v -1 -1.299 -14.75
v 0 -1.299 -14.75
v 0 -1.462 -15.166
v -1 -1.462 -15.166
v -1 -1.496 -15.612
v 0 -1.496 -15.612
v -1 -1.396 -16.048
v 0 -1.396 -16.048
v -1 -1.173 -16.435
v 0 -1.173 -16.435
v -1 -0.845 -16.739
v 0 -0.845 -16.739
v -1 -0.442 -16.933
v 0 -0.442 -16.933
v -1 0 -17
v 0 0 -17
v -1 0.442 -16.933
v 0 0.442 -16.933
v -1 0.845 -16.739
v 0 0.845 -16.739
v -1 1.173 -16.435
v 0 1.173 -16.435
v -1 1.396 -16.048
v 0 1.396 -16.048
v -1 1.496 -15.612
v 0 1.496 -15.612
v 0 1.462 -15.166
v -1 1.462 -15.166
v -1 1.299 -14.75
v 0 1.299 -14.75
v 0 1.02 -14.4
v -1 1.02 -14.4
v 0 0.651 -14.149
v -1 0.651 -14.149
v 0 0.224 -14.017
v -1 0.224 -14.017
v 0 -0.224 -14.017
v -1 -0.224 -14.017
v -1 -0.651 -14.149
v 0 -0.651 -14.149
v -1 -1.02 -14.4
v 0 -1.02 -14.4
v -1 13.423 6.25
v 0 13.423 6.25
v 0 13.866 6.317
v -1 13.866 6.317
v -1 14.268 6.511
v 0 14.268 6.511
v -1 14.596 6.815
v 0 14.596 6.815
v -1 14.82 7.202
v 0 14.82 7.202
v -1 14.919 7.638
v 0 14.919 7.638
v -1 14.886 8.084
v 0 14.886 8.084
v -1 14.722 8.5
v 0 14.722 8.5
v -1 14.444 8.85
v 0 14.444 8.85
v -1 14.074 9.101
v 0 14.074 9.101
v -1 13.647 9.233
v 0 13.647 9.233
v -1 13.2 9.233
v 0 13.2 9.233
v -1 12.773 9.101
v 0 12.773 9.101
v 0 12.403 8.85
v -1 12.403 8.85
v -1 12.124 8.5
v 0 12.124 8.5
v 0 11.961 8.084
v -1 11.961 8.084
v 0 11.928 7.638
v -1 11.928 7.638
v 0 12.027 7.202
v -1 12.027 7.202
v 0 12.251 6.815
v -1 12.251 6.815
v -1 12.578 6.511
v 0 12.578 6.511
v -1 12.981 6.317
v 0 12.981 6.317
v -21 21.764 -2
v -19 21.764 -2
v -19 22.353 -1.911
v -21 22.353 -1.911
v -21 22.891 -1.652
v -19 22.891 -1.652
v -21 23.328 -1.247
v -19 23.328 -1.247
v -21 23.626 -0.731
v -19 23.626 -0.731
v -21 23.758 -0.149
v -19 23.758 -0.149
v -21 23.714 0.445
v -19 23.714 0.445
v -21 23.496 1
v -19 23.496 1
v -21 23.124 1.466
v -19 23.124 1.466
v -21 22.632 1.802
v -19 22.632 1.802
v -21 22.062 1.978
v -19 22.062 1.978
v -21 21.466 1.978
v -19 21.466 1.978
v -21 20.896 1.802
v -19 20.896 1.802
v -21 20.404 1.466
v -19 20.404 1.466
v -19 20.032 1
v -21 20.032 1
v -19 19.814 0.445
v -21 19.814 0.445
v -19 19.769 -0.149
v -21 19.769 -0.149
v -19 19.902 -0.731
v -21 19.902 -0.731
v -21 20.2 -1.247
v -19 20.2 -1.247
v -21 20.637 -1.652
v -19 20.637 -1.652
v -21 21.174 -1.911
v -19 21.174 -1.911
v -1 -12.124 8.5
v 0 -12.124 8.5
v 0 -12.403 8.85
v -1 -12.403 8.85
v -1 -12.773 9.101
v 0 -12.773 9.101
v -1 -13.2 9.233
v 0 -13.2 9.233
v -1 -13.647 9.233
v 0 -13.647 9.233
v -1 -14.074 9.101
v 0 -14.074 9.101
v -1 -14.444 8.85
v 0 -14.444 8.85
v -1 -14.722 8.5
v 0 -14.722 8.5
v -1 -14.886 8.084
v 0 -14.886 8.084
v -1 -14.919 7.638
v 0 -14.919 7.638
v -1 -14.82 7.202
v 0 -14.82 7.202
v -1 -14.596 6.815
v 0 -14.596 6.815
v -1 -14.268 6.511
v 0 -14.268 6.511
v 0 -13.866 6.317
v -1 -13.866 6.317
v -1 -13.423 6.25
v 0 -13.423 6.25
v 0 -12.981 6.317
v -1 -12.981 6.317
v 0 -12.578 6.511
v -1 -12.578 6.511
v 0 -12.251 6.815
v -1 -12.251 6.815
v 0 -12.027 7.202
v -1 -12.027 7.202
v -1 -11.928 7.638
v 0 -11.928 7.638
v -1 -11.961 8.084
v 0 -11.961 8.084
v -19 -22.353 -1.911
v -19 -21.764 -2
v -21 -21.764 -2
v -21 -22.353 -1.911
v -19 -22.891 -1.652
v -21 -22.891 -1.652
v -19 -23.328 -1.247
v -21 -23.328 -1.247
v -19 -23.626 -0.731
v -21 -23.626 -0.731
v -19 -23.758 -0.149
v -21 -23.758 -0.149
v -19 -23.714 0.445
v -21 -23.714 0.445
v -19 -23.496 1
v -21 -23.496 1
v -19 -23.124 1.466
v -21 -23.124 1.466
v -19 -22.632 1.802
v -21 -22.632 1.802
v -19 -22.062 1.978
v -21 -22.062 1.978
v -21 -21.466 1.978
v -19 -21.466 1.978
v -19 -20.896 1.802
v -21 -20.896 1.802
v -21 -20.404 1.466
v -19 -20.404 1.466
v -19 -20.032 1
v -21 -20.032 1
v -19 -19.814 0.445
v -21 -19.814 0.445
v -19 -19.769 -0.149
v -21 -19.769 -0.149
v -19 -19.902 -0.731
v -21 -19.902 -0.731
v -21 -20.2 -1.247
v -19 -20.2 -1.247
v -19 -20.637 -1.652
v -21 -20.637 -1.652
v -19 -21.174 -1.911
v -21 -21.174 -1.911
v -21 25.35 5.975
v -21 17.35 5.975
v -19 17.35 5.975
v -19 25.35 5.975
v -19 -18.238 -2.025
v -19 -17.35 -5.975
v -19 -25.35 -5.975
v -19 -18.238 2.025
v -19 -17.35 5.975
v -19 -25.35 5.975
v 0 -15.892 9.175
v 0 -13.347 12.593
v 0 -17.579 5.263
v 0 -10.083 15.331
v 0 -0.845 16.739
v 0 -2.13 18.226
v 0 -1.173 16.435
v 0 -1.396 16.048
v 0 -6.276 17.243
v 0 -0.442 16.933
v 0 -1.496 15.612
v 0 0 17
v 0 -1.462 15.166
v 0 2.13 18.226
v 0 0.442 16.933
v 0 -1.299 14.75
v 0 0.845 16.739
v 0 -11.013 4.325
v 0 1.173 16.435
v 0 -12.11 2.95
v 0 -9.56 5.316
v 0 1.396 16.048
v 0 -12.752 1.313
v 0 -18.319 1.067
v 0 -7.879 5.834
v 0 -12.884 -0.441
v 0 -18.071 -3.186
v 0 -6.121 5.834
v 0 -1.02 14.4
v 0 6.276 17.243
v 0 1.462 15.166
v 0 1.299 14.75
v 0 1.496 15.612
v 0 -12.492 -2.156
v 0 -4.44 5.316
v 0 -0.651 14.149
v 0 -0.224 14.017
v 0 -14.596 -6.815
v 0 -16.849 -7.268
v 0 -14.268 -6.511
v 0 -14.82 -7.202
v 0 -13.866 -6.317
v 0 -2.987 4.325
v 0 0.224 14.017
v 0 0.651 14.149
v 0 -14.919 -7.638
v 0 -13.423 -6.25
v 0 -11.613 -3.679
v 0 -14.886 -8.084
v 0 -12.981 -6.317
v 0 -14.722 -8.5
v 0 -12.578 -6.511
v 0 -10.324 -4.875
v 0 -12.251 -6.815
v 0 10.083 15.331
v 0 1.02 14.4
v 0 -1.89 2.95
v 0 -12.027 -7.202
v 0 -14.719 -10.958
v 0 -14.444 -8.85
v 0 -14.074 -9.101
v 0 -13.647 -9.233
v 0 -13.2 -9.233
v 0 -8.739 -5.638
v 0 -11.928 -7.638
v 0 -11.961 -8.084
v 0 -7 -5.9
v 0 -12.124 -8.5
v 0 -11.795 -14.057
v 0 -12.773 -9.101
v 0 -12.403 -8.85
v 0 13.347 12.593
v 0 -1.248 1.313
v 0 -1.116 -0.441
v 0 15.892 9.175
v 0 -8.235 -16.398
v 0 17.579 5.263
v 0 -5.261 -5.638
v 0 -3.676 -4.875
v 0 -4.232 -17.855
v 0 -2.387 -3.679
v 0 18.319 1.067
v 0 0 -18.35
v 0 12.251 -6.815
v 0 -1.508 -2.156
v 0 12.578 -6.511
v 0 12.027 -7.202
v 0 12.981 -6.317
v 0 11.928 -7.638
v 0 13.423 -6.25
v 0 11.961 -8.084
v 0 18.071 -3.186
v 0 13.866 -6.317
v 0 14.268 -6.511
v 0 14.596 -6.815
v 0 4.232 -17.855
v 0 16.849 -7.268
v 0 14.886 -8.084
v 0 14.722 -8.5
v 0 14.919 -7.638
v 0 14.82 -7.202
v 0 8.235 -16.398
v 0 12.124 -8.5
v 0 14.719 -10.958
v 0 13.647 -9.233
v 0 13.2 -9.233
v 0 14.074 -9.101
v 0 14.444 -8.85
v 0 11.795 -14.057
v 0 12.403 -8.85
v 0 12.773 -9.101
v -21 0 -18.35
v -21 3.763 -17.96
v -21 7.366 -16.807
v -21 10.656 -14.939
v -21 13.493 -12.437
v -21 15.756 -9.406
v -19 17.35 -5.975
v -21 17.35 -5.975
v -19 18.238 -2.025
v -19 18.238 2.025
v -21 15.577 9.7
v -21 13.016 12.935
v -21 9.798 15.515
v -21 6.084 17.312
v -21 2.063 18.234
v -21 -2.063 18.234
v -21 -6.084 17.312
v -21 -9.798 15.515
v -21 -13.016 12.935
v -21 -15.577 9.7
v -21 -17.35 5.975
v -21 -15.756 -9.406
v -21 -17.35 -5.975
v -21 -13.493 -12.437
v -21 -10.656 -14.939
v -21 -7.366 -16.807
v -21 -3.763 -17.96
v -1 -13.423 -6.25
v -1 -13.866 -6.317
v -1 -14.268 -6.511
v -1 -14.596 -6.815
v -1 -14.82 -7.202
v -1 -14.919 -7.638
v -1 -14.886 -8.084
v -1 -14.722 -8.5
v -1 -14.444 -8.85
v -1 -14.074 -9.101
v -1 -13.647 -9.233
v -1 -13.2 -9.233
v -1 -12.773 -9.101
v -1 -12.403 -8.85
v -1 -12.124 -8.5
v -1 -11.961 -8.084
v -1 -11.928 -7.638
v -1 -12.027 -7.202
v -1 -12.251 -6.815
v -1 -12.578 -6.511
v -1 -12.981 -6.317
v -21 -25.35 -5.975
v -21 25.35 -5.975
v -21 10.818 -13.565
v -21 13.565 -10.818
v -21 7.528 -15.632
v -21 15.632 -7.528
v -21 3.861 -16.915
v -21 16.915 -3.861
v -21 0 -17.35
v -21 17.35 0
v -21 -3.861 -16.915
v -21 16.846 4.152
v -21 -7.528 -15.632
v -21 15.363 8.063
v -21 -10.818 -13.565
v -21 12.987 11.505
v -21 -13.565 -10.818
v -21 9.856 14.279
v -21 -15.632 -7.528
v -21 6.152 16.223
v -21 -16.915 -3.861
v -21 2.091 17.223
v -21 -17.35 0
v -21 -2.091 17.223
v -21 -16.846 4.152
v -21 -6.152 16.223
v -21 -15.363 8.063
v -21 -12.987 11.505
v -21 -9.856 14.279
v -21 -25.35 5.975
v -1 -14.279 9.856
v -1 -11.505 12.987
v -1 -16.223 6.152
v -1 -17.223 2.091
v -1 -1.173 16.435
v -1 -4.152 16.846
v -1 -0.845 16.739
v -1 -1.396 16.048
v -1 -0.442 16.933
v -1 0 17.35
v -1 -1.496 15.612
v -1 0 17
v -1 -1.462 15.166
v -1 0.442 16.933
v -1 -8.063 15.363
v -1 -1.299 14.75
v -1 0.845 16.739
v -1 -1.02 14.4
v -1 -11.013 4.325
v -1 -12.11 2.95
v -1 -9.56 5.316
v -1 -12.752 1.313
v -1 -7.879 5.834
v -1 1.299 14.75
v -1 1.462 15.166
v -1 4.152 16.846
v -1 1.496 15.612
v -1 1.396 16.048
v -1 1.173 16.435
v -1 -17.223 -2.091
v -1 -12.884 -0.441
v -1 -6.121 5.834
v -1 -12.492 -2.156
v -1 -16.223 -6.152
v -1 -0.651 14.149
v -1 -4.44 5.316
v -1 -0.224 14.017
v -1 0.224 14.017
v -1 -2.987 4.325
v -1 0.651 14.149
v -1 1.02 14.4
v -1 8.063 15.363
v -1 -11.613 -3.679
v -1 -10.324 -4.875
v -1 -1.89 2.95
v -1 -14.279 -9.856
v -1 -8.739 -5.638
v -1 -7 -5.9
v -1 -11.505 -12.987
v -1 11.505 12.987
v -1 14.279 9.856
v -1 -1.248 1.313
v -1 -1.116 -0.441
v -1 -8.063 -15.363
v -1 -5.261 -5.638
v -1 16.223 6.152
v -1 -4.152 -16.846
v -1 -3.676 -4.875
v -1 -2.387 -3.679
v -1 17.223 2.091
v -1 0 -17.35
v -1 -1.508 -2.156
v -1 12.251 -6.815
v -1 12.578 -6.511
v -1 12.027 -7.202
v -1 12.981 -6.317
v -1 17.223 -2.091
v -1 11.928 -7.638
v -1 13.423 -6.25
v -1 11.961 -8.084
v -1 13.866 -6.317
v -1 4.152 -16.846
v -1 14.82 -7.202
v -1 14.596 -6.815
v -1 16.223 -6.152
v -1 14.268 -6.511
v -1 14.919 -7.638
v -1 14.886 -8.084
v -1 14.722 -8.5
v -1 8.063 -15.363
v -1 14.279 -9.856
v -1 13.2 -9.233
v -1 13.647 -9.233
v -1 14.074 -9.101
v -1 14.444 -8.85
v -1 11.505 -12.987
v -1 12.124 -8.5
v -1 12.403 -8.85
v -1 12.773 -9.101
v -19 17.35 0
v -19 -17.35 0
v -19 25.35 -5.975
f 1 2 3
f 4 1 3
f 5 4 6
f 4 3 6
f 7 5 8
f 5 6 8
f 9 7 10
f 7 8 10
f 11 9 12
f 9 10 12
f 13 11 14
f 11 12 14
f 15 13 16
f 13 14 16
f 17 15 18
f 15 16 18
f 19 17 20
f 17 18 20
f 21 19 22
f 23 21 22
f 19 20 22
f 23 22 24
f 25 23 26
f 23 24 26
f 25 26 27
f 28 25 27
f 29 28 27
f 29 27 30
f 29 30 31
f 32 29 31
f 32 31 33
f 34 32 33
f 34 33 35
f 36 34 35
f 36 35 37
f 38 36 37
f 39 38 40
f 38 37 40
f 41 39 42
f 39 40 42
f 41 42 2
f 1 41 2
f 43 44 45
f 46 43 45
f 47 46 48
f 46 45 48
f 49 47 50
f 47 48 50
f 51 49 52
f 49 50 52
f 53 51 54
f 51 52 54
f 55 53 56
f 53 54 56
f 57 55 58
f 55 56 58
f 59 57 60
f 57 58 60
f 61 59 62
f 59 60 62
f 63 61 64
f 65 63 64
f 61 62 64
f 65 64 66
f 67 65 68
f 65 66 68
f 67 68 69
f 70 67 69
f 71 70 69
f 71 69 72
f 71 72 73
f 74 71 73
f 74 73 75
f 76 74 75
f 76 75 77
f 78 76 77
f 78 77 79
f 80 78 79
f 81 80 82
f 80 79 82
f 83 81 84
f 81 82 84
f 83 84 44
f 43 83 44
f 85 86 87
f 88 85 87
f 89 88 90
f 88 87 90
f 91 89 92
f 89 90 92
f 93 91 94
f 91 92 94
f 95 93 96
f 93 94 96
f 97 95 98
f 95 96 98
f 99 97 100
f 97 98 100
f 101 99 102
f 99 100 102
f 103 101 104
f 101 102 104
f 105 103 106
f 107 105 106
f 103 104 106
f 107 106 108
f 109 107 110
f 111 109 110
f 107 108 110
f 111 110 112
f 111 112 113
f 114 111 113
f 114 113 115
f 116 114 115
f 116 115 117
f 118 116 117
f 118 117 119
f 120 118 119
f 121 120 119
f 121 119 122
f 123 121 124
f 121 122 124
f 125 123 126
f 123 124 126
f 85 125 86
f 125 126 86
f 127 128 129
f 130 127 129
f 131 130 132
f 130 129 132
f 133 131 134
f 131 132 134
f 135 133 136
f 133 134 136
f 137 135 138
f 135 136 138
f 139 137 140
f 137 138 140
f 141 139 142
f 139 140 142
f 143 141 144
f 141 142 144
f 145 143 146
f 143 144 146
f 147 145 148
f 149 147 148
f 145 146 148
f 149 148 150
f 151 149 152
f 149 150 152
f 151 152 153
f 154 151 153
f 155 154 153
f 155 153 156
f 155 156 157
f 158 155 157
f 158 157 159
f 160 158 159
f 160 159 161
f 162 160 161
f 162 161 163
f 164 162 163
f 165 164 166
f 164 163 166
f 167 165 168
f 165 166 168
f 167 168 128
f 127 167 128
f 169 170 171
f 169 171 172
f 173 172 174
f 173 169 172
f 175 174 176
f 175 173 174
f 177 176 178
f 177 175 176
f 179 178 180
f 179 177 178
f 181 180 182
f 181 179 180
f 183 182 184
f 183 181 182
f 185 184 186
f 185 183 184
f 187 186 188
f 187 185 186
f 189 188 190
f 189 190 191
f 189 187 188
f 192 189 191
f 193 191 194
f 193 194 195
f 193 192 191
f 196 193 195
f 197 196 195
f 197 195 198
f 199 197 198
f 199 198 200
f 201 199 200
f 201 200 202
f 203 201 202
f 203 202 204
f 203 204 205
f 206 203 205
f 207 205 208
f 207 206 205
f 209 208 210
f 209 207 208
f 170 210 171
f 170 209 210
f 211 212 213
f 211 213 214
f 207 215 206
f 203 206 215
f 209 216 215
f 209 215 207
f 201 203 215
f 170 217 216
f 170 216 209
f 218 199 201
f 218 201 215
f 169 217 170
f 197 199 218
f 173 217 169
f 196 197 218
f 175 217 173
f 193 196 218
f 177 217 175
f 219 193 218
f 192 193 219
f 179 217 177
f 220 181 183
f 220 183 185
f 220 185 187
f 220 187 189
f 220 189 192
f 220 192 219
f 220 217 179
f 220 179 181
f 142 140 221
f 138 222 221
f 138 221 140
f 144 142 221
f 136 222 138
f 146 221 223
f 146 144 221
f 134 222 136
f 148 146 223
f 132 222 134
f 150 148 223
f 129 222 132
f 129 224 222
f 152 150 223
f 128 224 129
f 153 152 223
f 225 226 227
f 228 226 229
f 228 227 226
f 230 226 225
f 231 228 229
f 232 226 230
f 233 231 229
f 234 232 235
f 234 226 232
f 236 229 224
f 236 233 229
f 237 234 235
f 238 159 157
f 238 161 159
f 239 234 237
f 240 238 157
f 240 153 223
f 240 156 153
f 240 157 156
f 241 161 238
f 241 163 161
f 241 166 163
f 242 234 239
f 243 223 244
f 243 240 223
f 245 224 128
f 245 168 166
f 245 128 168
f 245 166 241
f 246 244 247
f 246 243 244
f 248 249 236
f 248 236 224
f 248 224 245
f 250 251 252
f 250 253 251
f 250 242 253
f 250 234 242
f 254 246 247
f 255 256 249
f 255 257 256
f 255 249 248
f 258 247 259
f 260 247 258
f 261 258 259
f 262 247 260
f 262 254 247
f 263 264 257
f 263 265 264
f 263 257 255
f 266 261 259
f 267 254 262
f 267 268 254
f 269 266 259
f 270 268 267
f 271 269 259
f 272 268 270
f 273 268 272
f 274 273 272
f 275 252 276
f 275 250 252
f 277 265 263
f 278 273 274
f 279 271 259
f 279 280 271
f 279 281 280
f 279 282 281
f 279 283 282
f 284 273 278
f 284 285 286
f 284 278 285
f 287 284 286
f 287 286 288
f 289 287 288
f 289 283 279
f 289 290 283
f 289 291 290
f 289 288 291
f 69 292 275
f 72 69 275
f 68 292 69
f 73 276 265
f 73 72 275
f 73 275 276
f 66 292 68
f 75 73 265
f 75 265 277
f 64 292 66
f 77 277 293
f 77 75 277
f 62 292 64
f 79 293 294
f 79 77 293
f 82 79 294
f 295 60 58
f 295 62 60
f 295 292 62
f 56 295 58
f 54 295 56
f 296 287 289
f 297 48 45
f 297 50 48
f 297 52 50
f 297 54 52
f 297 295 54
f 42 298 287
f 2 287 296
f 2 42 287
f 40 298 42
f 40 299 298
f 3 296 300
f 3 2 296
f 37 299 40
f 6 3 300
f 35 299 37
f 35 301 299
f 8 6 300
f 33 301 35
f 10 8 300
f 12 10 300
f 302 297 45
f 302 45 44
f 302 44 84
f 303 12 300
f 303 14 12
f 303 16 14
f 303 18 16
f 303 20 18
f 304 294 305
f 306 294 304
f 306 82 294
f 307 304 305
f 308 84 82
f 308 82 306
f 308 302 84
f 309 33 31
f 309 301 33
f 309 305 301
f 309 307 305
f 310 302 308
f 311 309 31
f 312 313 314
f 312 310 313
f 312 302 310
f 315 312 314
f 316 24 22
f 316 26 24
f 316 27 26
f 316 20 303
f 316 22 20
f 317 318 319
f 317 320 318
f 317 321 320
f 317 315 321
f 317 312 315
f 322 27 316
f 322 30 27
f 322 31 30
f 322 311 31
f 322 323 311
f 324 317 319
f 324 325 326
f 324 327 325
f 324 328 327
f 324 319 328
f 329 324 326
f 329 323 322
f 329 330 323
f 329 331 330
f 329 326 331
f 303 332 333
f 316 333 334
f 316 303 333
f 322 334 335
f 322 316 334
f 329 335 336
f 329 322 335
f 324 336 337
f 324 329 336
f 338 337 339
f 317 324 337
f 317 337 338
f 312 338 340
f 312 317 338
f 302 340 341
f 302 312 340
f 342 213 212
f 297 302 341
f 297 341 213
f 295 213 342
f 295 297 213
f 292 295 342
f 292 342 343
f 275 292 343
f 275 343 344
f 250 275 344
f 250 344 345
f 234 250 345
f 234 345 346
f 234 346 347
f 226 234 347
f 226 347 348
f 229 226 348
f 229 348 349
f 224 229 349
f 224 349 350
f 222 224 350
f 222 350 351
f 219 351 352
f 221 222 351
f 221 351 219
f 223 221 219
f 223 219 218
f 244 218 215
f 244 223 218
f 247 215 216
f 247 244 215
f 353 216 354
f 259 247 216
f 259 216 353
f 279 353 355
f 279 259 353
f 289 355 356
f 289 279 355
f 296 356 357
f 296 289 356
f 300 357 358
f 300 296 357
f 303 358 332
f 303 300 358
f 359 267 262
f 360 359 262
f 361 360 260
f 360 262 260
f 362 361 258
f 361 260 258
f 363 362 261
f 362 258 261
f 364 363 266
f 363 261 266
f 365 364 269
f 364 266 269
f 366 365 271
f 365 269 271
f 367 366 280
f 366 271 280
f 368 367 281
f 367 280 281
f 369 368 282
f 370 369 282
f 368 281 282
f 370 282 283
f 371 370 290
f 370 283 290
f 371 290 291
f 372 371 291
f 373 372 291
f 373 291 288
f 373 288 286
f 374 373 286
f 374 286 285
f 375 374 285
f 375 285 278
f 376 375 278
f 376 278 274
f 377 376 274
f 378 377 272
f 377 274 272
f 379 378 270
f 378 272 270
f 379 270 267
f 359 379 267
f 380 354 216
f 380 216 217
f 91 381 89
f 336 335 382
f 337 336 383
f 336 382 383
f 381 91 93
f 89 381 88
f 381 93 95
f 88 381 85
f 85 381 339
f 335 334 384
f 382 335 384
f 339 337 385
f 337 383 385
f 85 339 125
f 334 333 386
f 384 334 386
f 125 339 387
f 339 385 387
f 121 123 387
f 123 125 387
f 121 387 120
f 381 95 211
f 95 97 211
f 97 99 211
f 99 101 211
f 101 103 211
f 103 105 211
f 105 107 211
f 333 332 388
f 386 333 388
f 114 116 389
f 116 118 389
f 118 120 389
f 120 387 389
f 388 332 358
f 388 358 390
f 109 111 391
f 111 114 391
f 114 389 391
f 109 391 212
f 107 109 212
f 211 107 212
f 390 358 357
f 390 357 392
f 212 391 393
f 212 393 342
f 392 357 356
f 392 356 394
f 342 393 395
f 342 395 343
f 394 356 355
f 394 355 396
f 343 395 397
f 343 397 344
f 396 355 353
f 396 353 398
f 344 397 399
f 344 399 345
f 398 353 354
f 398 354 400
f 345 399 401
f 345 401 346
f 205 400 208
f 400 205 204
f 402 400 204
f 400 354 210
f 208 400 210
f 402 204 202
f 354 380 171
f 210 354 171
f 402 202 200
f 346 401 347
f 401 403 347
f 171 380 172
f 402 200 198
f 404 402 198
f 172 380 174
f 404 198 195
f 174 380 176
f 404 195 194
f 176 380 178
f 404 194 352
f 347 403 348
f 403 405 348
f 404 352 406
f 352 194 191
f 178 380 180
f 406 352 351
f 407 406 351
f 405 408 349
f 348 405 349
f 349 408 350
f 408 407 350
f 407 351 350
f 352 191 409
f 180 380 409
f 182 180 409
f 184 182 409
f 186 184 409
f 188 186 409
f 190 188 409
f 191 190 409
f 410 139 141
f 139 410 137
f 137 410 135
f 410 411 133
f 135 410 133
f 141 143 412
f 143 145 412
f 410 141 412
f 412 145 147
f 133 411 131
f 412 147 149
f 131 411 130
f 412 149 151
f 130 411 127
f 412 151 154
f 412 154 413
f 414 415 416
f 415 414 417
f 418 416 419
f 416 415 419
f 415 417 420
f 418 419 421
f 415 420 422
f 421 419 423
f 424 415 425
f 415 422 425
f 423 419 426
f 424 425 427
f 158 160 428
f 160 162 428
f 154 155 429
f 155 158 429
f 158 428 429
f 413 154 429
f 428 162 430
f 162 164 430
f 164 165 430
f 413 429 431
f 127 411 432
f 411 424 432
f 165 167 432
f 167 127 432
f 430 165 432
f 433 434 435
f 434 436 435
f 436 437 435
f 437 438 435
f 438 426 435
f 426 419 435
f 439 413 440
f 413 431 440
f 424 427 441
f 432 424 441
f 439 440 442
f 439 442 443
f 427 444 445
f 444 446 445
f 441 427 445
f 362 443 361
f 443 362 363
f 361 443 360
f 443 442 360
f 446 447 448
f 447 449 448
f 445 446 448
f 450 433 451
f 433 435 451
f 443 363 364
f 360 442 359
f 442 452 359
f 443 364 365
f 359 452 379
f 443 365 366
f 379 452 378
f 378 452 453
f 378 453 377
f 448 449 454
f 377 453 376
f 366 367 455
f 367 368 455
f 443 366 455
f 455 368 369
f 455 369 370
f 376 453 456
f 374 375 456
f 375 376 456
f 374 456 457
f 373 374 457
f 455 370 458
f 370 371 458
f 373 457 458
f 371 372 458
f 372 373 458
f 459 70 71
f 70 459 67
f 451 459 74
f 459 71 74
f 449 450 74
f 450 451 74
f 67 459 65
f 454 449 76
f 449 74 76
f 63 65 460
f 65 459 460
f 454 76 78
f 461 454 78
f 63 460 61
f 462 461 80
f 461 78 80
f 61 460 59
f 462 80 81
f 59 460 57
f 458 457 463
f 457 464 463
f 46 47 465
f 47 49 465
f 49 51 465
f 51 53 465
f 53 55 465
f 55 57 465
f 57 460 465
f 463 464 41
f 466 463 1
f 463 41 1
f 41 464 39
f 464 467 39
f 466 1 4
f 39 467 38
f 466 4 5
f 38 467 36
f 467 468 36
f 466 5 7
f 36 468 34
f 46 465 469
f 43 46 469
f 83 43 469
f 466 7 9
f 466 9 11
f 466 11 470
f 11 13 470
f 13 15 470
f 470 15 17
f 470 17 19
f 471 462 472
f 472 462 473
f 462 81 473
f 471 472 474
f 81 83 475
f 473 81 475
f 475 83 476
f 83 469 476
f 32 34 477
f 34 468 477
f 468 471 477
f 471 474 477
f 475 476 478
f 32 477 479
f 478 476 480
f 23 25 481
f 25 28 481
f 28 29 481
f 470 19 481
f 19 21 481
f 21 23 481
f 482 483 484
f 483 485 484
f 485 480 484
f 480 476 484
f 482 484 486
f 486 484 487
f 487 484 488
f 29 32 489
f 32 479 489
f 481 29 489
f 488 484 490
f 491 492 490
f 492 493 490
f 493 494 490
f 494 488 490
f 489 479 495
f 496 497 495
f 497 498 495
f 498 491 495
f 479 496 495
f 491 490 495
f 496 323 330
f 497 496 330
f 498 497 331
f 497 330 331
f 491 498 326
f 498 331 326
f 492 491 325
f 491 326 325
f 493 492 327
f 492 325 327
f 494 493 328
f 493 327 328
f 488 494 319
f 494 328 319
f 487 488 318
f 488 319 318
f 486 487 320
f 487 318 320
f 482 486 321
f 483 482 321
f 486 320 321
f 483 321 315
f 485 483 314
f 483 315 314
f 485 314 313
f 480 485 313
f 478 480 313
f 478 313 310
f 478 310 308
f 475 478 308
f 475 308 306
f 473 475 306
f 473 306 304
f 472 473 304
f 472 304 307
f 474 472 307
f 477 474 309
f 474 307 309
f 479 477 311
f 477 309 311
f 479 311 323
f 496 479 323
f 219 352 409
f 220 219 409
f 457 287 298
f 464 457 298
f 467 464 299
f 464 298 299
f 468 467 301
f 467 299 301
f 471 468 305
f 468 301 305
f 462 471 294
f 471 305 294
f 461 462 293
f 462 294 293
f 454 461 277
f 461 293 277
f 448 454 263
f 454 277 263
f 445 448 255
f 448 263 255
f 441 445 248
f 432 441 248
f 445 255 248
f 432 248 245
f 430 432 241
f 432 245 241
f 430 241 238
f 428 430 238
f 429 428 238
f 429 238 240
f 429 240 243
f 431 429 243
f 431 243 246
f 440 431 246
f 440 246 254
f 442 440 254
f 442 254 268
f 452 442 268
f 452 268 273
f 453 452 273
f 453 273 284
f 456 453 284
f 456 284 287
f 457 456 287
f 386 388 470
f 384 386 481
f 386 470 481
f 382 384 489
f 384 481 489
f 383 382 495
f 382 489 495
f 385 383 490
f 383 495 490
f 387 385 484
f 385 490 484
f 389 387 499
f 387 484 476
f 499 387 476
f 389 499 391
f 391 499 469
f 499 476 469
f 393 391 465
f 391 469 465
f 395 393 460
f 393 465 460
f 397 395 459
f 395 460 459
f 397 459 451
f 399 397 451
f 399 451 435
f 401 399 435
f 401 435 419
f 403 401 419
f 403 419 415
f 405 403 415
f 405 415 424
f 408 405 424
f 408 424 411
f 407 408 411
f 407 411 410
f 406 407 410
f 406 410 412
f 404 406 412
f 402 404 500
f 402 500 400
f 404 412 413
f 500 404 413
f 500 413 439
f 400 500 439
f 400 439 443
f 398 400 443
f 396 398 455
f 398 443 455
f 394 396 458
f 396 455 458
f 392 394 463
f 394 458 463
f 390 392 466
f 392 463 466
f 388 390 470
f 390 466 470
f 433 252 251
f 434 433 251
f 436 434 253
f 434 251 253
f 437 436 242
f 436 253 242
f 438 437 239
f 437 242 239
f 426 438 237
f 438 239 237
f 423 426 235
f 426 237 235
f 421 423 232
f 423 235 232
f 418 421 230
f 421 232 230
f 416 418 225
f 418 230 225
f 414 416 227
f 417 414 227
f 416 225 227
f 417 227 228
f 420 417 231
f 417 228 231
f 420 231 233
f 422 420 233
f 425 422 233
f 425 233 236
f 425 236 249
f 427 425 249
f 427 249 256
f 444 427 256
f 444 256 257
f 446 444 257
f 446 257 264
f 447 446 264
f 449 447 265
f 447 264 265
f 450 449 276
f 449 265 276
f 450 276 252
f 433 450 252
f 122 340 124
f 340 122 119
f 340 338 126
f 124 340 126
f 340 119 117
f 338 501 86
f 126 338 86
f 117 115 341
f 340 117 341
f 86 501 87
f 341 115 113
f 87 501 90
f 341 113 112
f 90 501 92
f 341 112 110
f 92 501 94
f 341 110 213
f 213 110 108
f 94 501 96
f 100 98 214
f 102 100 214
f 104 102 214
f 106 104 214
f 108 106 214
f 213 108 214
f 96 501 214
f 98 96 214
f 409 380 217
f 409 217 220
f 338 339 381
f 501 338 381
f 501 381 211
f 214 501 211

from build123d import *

# Parameters (mm, degrees)
SKETCH1_R           = 18.35
BOSS_EXTRUDE1_DEPTH = 21
SHELL1_T            = -1
SKETCH3_R           = 1.5
CUT_EXTRUDE2_DEPTH  = 1
CIRPATTERN1_COUNT   = 6
SKETCH4_R           = 5.9
CUT_EXTRUDE3_DEPTH  = 10
SKETCH5_W           = 11.949895398
SKETCH5_H           = 8
BOSS_EXTRUDE2_DEPTH = 2
SKETCH6_R           = 2
CUT_EXTRUDE4_DEPTH  = 2


with BuildPart() as part:
    # Sketch1 → Boss-Extrude1 (new body)
    with BuildSketch(Plane(origin=(0, 0, 0), x_dir=(0, 0, -1), z_dir=(1, 0, 0))):
        Circle(SKETCH1_R)
    extrude(amount=-BOSS_EXTRUDE1_DEPTH)

    # Shell1
    shell1_openings = [part.faces().sort_by_distance(p)[0] for p in [
        (-21, 0, 0),
    ]]
    offset(amount=SHELL1_T, openings=shell1_openings, kind=Kind.INTERSECTION)

    # Sketch3 → Cut-Extrude2 (cut)
    with BuildSketch(Plane(origin=(0, 0, 0), x_dir=(0, 0, -1), z_dir=(1, 0, 0))):
        with Locations((-7.75, 13.423393759)):
            Circle(SKETCH3_R)
    cut_extrude2 = extrude(amount=-CUT_EXTRUDE2_DEPTH, mode=Mode.SUBTRACT)

    # CirPattern1: Cut-Extrude2 ×6 about axis
    cirpattern1_axis = Axis((0, 0, 0), (1, 0, 0))
    for i in range(1, CIRPATTERN1_COUNT):
        add(cut_extrude2.rotate(cirpattern1_axis, i * 360 / CIRPATTERN1_COUNT), mode=Mode.SUBTRACT)

    # Sketch4 → Cut-Extrude3 (cut)
    with BuildSketch(Plane(origin=(0, 0, 0), x_dir=(0, 0, -1), z_dir=(1, 0, 0))):
        with Locations((0, -7)):
            Circle(SKETCH4_R)
    extrude(amount=-CUT_EXTRUDE3_DEPTH, mode=Mode.SUBTRACT)

    # Sketch5 → Boss-Extrude2 (add)
    with BuildSketch(Plane.ZY.offset(21)):
        with Locations((0, 21.35)):
            Rectangle(SKETCH5_W, SKETCH5_H)
    boss_extrude2 = extrude(amount=-BOSS_EXTRUDE2_DEPTH)

    # Sketch6 → Cut-Extrude4 (cut)
    with BuildSketch(Plane(origin=(-19, 0, 0), x_dir=(0, 0, -1), z_dir=(1, 0, 0))):
        with Locations((0, 21.763901495)):
            Circle(SKETCH6_R)
    cut_extrude4 = extrude(amount=-CUT_EXTRUDE4_DEPTH, mode=Mode.SUBTRACT)

    # Mirror1: Boss-Extrude2, Cut-Extrude4 across plane
    add(boss_extrude2.mirror(Plane.ZX))
    add(cut_extrude4.mirror(Plane.ZX), mode=Mode.SUBTRACT)


solid = part.part
